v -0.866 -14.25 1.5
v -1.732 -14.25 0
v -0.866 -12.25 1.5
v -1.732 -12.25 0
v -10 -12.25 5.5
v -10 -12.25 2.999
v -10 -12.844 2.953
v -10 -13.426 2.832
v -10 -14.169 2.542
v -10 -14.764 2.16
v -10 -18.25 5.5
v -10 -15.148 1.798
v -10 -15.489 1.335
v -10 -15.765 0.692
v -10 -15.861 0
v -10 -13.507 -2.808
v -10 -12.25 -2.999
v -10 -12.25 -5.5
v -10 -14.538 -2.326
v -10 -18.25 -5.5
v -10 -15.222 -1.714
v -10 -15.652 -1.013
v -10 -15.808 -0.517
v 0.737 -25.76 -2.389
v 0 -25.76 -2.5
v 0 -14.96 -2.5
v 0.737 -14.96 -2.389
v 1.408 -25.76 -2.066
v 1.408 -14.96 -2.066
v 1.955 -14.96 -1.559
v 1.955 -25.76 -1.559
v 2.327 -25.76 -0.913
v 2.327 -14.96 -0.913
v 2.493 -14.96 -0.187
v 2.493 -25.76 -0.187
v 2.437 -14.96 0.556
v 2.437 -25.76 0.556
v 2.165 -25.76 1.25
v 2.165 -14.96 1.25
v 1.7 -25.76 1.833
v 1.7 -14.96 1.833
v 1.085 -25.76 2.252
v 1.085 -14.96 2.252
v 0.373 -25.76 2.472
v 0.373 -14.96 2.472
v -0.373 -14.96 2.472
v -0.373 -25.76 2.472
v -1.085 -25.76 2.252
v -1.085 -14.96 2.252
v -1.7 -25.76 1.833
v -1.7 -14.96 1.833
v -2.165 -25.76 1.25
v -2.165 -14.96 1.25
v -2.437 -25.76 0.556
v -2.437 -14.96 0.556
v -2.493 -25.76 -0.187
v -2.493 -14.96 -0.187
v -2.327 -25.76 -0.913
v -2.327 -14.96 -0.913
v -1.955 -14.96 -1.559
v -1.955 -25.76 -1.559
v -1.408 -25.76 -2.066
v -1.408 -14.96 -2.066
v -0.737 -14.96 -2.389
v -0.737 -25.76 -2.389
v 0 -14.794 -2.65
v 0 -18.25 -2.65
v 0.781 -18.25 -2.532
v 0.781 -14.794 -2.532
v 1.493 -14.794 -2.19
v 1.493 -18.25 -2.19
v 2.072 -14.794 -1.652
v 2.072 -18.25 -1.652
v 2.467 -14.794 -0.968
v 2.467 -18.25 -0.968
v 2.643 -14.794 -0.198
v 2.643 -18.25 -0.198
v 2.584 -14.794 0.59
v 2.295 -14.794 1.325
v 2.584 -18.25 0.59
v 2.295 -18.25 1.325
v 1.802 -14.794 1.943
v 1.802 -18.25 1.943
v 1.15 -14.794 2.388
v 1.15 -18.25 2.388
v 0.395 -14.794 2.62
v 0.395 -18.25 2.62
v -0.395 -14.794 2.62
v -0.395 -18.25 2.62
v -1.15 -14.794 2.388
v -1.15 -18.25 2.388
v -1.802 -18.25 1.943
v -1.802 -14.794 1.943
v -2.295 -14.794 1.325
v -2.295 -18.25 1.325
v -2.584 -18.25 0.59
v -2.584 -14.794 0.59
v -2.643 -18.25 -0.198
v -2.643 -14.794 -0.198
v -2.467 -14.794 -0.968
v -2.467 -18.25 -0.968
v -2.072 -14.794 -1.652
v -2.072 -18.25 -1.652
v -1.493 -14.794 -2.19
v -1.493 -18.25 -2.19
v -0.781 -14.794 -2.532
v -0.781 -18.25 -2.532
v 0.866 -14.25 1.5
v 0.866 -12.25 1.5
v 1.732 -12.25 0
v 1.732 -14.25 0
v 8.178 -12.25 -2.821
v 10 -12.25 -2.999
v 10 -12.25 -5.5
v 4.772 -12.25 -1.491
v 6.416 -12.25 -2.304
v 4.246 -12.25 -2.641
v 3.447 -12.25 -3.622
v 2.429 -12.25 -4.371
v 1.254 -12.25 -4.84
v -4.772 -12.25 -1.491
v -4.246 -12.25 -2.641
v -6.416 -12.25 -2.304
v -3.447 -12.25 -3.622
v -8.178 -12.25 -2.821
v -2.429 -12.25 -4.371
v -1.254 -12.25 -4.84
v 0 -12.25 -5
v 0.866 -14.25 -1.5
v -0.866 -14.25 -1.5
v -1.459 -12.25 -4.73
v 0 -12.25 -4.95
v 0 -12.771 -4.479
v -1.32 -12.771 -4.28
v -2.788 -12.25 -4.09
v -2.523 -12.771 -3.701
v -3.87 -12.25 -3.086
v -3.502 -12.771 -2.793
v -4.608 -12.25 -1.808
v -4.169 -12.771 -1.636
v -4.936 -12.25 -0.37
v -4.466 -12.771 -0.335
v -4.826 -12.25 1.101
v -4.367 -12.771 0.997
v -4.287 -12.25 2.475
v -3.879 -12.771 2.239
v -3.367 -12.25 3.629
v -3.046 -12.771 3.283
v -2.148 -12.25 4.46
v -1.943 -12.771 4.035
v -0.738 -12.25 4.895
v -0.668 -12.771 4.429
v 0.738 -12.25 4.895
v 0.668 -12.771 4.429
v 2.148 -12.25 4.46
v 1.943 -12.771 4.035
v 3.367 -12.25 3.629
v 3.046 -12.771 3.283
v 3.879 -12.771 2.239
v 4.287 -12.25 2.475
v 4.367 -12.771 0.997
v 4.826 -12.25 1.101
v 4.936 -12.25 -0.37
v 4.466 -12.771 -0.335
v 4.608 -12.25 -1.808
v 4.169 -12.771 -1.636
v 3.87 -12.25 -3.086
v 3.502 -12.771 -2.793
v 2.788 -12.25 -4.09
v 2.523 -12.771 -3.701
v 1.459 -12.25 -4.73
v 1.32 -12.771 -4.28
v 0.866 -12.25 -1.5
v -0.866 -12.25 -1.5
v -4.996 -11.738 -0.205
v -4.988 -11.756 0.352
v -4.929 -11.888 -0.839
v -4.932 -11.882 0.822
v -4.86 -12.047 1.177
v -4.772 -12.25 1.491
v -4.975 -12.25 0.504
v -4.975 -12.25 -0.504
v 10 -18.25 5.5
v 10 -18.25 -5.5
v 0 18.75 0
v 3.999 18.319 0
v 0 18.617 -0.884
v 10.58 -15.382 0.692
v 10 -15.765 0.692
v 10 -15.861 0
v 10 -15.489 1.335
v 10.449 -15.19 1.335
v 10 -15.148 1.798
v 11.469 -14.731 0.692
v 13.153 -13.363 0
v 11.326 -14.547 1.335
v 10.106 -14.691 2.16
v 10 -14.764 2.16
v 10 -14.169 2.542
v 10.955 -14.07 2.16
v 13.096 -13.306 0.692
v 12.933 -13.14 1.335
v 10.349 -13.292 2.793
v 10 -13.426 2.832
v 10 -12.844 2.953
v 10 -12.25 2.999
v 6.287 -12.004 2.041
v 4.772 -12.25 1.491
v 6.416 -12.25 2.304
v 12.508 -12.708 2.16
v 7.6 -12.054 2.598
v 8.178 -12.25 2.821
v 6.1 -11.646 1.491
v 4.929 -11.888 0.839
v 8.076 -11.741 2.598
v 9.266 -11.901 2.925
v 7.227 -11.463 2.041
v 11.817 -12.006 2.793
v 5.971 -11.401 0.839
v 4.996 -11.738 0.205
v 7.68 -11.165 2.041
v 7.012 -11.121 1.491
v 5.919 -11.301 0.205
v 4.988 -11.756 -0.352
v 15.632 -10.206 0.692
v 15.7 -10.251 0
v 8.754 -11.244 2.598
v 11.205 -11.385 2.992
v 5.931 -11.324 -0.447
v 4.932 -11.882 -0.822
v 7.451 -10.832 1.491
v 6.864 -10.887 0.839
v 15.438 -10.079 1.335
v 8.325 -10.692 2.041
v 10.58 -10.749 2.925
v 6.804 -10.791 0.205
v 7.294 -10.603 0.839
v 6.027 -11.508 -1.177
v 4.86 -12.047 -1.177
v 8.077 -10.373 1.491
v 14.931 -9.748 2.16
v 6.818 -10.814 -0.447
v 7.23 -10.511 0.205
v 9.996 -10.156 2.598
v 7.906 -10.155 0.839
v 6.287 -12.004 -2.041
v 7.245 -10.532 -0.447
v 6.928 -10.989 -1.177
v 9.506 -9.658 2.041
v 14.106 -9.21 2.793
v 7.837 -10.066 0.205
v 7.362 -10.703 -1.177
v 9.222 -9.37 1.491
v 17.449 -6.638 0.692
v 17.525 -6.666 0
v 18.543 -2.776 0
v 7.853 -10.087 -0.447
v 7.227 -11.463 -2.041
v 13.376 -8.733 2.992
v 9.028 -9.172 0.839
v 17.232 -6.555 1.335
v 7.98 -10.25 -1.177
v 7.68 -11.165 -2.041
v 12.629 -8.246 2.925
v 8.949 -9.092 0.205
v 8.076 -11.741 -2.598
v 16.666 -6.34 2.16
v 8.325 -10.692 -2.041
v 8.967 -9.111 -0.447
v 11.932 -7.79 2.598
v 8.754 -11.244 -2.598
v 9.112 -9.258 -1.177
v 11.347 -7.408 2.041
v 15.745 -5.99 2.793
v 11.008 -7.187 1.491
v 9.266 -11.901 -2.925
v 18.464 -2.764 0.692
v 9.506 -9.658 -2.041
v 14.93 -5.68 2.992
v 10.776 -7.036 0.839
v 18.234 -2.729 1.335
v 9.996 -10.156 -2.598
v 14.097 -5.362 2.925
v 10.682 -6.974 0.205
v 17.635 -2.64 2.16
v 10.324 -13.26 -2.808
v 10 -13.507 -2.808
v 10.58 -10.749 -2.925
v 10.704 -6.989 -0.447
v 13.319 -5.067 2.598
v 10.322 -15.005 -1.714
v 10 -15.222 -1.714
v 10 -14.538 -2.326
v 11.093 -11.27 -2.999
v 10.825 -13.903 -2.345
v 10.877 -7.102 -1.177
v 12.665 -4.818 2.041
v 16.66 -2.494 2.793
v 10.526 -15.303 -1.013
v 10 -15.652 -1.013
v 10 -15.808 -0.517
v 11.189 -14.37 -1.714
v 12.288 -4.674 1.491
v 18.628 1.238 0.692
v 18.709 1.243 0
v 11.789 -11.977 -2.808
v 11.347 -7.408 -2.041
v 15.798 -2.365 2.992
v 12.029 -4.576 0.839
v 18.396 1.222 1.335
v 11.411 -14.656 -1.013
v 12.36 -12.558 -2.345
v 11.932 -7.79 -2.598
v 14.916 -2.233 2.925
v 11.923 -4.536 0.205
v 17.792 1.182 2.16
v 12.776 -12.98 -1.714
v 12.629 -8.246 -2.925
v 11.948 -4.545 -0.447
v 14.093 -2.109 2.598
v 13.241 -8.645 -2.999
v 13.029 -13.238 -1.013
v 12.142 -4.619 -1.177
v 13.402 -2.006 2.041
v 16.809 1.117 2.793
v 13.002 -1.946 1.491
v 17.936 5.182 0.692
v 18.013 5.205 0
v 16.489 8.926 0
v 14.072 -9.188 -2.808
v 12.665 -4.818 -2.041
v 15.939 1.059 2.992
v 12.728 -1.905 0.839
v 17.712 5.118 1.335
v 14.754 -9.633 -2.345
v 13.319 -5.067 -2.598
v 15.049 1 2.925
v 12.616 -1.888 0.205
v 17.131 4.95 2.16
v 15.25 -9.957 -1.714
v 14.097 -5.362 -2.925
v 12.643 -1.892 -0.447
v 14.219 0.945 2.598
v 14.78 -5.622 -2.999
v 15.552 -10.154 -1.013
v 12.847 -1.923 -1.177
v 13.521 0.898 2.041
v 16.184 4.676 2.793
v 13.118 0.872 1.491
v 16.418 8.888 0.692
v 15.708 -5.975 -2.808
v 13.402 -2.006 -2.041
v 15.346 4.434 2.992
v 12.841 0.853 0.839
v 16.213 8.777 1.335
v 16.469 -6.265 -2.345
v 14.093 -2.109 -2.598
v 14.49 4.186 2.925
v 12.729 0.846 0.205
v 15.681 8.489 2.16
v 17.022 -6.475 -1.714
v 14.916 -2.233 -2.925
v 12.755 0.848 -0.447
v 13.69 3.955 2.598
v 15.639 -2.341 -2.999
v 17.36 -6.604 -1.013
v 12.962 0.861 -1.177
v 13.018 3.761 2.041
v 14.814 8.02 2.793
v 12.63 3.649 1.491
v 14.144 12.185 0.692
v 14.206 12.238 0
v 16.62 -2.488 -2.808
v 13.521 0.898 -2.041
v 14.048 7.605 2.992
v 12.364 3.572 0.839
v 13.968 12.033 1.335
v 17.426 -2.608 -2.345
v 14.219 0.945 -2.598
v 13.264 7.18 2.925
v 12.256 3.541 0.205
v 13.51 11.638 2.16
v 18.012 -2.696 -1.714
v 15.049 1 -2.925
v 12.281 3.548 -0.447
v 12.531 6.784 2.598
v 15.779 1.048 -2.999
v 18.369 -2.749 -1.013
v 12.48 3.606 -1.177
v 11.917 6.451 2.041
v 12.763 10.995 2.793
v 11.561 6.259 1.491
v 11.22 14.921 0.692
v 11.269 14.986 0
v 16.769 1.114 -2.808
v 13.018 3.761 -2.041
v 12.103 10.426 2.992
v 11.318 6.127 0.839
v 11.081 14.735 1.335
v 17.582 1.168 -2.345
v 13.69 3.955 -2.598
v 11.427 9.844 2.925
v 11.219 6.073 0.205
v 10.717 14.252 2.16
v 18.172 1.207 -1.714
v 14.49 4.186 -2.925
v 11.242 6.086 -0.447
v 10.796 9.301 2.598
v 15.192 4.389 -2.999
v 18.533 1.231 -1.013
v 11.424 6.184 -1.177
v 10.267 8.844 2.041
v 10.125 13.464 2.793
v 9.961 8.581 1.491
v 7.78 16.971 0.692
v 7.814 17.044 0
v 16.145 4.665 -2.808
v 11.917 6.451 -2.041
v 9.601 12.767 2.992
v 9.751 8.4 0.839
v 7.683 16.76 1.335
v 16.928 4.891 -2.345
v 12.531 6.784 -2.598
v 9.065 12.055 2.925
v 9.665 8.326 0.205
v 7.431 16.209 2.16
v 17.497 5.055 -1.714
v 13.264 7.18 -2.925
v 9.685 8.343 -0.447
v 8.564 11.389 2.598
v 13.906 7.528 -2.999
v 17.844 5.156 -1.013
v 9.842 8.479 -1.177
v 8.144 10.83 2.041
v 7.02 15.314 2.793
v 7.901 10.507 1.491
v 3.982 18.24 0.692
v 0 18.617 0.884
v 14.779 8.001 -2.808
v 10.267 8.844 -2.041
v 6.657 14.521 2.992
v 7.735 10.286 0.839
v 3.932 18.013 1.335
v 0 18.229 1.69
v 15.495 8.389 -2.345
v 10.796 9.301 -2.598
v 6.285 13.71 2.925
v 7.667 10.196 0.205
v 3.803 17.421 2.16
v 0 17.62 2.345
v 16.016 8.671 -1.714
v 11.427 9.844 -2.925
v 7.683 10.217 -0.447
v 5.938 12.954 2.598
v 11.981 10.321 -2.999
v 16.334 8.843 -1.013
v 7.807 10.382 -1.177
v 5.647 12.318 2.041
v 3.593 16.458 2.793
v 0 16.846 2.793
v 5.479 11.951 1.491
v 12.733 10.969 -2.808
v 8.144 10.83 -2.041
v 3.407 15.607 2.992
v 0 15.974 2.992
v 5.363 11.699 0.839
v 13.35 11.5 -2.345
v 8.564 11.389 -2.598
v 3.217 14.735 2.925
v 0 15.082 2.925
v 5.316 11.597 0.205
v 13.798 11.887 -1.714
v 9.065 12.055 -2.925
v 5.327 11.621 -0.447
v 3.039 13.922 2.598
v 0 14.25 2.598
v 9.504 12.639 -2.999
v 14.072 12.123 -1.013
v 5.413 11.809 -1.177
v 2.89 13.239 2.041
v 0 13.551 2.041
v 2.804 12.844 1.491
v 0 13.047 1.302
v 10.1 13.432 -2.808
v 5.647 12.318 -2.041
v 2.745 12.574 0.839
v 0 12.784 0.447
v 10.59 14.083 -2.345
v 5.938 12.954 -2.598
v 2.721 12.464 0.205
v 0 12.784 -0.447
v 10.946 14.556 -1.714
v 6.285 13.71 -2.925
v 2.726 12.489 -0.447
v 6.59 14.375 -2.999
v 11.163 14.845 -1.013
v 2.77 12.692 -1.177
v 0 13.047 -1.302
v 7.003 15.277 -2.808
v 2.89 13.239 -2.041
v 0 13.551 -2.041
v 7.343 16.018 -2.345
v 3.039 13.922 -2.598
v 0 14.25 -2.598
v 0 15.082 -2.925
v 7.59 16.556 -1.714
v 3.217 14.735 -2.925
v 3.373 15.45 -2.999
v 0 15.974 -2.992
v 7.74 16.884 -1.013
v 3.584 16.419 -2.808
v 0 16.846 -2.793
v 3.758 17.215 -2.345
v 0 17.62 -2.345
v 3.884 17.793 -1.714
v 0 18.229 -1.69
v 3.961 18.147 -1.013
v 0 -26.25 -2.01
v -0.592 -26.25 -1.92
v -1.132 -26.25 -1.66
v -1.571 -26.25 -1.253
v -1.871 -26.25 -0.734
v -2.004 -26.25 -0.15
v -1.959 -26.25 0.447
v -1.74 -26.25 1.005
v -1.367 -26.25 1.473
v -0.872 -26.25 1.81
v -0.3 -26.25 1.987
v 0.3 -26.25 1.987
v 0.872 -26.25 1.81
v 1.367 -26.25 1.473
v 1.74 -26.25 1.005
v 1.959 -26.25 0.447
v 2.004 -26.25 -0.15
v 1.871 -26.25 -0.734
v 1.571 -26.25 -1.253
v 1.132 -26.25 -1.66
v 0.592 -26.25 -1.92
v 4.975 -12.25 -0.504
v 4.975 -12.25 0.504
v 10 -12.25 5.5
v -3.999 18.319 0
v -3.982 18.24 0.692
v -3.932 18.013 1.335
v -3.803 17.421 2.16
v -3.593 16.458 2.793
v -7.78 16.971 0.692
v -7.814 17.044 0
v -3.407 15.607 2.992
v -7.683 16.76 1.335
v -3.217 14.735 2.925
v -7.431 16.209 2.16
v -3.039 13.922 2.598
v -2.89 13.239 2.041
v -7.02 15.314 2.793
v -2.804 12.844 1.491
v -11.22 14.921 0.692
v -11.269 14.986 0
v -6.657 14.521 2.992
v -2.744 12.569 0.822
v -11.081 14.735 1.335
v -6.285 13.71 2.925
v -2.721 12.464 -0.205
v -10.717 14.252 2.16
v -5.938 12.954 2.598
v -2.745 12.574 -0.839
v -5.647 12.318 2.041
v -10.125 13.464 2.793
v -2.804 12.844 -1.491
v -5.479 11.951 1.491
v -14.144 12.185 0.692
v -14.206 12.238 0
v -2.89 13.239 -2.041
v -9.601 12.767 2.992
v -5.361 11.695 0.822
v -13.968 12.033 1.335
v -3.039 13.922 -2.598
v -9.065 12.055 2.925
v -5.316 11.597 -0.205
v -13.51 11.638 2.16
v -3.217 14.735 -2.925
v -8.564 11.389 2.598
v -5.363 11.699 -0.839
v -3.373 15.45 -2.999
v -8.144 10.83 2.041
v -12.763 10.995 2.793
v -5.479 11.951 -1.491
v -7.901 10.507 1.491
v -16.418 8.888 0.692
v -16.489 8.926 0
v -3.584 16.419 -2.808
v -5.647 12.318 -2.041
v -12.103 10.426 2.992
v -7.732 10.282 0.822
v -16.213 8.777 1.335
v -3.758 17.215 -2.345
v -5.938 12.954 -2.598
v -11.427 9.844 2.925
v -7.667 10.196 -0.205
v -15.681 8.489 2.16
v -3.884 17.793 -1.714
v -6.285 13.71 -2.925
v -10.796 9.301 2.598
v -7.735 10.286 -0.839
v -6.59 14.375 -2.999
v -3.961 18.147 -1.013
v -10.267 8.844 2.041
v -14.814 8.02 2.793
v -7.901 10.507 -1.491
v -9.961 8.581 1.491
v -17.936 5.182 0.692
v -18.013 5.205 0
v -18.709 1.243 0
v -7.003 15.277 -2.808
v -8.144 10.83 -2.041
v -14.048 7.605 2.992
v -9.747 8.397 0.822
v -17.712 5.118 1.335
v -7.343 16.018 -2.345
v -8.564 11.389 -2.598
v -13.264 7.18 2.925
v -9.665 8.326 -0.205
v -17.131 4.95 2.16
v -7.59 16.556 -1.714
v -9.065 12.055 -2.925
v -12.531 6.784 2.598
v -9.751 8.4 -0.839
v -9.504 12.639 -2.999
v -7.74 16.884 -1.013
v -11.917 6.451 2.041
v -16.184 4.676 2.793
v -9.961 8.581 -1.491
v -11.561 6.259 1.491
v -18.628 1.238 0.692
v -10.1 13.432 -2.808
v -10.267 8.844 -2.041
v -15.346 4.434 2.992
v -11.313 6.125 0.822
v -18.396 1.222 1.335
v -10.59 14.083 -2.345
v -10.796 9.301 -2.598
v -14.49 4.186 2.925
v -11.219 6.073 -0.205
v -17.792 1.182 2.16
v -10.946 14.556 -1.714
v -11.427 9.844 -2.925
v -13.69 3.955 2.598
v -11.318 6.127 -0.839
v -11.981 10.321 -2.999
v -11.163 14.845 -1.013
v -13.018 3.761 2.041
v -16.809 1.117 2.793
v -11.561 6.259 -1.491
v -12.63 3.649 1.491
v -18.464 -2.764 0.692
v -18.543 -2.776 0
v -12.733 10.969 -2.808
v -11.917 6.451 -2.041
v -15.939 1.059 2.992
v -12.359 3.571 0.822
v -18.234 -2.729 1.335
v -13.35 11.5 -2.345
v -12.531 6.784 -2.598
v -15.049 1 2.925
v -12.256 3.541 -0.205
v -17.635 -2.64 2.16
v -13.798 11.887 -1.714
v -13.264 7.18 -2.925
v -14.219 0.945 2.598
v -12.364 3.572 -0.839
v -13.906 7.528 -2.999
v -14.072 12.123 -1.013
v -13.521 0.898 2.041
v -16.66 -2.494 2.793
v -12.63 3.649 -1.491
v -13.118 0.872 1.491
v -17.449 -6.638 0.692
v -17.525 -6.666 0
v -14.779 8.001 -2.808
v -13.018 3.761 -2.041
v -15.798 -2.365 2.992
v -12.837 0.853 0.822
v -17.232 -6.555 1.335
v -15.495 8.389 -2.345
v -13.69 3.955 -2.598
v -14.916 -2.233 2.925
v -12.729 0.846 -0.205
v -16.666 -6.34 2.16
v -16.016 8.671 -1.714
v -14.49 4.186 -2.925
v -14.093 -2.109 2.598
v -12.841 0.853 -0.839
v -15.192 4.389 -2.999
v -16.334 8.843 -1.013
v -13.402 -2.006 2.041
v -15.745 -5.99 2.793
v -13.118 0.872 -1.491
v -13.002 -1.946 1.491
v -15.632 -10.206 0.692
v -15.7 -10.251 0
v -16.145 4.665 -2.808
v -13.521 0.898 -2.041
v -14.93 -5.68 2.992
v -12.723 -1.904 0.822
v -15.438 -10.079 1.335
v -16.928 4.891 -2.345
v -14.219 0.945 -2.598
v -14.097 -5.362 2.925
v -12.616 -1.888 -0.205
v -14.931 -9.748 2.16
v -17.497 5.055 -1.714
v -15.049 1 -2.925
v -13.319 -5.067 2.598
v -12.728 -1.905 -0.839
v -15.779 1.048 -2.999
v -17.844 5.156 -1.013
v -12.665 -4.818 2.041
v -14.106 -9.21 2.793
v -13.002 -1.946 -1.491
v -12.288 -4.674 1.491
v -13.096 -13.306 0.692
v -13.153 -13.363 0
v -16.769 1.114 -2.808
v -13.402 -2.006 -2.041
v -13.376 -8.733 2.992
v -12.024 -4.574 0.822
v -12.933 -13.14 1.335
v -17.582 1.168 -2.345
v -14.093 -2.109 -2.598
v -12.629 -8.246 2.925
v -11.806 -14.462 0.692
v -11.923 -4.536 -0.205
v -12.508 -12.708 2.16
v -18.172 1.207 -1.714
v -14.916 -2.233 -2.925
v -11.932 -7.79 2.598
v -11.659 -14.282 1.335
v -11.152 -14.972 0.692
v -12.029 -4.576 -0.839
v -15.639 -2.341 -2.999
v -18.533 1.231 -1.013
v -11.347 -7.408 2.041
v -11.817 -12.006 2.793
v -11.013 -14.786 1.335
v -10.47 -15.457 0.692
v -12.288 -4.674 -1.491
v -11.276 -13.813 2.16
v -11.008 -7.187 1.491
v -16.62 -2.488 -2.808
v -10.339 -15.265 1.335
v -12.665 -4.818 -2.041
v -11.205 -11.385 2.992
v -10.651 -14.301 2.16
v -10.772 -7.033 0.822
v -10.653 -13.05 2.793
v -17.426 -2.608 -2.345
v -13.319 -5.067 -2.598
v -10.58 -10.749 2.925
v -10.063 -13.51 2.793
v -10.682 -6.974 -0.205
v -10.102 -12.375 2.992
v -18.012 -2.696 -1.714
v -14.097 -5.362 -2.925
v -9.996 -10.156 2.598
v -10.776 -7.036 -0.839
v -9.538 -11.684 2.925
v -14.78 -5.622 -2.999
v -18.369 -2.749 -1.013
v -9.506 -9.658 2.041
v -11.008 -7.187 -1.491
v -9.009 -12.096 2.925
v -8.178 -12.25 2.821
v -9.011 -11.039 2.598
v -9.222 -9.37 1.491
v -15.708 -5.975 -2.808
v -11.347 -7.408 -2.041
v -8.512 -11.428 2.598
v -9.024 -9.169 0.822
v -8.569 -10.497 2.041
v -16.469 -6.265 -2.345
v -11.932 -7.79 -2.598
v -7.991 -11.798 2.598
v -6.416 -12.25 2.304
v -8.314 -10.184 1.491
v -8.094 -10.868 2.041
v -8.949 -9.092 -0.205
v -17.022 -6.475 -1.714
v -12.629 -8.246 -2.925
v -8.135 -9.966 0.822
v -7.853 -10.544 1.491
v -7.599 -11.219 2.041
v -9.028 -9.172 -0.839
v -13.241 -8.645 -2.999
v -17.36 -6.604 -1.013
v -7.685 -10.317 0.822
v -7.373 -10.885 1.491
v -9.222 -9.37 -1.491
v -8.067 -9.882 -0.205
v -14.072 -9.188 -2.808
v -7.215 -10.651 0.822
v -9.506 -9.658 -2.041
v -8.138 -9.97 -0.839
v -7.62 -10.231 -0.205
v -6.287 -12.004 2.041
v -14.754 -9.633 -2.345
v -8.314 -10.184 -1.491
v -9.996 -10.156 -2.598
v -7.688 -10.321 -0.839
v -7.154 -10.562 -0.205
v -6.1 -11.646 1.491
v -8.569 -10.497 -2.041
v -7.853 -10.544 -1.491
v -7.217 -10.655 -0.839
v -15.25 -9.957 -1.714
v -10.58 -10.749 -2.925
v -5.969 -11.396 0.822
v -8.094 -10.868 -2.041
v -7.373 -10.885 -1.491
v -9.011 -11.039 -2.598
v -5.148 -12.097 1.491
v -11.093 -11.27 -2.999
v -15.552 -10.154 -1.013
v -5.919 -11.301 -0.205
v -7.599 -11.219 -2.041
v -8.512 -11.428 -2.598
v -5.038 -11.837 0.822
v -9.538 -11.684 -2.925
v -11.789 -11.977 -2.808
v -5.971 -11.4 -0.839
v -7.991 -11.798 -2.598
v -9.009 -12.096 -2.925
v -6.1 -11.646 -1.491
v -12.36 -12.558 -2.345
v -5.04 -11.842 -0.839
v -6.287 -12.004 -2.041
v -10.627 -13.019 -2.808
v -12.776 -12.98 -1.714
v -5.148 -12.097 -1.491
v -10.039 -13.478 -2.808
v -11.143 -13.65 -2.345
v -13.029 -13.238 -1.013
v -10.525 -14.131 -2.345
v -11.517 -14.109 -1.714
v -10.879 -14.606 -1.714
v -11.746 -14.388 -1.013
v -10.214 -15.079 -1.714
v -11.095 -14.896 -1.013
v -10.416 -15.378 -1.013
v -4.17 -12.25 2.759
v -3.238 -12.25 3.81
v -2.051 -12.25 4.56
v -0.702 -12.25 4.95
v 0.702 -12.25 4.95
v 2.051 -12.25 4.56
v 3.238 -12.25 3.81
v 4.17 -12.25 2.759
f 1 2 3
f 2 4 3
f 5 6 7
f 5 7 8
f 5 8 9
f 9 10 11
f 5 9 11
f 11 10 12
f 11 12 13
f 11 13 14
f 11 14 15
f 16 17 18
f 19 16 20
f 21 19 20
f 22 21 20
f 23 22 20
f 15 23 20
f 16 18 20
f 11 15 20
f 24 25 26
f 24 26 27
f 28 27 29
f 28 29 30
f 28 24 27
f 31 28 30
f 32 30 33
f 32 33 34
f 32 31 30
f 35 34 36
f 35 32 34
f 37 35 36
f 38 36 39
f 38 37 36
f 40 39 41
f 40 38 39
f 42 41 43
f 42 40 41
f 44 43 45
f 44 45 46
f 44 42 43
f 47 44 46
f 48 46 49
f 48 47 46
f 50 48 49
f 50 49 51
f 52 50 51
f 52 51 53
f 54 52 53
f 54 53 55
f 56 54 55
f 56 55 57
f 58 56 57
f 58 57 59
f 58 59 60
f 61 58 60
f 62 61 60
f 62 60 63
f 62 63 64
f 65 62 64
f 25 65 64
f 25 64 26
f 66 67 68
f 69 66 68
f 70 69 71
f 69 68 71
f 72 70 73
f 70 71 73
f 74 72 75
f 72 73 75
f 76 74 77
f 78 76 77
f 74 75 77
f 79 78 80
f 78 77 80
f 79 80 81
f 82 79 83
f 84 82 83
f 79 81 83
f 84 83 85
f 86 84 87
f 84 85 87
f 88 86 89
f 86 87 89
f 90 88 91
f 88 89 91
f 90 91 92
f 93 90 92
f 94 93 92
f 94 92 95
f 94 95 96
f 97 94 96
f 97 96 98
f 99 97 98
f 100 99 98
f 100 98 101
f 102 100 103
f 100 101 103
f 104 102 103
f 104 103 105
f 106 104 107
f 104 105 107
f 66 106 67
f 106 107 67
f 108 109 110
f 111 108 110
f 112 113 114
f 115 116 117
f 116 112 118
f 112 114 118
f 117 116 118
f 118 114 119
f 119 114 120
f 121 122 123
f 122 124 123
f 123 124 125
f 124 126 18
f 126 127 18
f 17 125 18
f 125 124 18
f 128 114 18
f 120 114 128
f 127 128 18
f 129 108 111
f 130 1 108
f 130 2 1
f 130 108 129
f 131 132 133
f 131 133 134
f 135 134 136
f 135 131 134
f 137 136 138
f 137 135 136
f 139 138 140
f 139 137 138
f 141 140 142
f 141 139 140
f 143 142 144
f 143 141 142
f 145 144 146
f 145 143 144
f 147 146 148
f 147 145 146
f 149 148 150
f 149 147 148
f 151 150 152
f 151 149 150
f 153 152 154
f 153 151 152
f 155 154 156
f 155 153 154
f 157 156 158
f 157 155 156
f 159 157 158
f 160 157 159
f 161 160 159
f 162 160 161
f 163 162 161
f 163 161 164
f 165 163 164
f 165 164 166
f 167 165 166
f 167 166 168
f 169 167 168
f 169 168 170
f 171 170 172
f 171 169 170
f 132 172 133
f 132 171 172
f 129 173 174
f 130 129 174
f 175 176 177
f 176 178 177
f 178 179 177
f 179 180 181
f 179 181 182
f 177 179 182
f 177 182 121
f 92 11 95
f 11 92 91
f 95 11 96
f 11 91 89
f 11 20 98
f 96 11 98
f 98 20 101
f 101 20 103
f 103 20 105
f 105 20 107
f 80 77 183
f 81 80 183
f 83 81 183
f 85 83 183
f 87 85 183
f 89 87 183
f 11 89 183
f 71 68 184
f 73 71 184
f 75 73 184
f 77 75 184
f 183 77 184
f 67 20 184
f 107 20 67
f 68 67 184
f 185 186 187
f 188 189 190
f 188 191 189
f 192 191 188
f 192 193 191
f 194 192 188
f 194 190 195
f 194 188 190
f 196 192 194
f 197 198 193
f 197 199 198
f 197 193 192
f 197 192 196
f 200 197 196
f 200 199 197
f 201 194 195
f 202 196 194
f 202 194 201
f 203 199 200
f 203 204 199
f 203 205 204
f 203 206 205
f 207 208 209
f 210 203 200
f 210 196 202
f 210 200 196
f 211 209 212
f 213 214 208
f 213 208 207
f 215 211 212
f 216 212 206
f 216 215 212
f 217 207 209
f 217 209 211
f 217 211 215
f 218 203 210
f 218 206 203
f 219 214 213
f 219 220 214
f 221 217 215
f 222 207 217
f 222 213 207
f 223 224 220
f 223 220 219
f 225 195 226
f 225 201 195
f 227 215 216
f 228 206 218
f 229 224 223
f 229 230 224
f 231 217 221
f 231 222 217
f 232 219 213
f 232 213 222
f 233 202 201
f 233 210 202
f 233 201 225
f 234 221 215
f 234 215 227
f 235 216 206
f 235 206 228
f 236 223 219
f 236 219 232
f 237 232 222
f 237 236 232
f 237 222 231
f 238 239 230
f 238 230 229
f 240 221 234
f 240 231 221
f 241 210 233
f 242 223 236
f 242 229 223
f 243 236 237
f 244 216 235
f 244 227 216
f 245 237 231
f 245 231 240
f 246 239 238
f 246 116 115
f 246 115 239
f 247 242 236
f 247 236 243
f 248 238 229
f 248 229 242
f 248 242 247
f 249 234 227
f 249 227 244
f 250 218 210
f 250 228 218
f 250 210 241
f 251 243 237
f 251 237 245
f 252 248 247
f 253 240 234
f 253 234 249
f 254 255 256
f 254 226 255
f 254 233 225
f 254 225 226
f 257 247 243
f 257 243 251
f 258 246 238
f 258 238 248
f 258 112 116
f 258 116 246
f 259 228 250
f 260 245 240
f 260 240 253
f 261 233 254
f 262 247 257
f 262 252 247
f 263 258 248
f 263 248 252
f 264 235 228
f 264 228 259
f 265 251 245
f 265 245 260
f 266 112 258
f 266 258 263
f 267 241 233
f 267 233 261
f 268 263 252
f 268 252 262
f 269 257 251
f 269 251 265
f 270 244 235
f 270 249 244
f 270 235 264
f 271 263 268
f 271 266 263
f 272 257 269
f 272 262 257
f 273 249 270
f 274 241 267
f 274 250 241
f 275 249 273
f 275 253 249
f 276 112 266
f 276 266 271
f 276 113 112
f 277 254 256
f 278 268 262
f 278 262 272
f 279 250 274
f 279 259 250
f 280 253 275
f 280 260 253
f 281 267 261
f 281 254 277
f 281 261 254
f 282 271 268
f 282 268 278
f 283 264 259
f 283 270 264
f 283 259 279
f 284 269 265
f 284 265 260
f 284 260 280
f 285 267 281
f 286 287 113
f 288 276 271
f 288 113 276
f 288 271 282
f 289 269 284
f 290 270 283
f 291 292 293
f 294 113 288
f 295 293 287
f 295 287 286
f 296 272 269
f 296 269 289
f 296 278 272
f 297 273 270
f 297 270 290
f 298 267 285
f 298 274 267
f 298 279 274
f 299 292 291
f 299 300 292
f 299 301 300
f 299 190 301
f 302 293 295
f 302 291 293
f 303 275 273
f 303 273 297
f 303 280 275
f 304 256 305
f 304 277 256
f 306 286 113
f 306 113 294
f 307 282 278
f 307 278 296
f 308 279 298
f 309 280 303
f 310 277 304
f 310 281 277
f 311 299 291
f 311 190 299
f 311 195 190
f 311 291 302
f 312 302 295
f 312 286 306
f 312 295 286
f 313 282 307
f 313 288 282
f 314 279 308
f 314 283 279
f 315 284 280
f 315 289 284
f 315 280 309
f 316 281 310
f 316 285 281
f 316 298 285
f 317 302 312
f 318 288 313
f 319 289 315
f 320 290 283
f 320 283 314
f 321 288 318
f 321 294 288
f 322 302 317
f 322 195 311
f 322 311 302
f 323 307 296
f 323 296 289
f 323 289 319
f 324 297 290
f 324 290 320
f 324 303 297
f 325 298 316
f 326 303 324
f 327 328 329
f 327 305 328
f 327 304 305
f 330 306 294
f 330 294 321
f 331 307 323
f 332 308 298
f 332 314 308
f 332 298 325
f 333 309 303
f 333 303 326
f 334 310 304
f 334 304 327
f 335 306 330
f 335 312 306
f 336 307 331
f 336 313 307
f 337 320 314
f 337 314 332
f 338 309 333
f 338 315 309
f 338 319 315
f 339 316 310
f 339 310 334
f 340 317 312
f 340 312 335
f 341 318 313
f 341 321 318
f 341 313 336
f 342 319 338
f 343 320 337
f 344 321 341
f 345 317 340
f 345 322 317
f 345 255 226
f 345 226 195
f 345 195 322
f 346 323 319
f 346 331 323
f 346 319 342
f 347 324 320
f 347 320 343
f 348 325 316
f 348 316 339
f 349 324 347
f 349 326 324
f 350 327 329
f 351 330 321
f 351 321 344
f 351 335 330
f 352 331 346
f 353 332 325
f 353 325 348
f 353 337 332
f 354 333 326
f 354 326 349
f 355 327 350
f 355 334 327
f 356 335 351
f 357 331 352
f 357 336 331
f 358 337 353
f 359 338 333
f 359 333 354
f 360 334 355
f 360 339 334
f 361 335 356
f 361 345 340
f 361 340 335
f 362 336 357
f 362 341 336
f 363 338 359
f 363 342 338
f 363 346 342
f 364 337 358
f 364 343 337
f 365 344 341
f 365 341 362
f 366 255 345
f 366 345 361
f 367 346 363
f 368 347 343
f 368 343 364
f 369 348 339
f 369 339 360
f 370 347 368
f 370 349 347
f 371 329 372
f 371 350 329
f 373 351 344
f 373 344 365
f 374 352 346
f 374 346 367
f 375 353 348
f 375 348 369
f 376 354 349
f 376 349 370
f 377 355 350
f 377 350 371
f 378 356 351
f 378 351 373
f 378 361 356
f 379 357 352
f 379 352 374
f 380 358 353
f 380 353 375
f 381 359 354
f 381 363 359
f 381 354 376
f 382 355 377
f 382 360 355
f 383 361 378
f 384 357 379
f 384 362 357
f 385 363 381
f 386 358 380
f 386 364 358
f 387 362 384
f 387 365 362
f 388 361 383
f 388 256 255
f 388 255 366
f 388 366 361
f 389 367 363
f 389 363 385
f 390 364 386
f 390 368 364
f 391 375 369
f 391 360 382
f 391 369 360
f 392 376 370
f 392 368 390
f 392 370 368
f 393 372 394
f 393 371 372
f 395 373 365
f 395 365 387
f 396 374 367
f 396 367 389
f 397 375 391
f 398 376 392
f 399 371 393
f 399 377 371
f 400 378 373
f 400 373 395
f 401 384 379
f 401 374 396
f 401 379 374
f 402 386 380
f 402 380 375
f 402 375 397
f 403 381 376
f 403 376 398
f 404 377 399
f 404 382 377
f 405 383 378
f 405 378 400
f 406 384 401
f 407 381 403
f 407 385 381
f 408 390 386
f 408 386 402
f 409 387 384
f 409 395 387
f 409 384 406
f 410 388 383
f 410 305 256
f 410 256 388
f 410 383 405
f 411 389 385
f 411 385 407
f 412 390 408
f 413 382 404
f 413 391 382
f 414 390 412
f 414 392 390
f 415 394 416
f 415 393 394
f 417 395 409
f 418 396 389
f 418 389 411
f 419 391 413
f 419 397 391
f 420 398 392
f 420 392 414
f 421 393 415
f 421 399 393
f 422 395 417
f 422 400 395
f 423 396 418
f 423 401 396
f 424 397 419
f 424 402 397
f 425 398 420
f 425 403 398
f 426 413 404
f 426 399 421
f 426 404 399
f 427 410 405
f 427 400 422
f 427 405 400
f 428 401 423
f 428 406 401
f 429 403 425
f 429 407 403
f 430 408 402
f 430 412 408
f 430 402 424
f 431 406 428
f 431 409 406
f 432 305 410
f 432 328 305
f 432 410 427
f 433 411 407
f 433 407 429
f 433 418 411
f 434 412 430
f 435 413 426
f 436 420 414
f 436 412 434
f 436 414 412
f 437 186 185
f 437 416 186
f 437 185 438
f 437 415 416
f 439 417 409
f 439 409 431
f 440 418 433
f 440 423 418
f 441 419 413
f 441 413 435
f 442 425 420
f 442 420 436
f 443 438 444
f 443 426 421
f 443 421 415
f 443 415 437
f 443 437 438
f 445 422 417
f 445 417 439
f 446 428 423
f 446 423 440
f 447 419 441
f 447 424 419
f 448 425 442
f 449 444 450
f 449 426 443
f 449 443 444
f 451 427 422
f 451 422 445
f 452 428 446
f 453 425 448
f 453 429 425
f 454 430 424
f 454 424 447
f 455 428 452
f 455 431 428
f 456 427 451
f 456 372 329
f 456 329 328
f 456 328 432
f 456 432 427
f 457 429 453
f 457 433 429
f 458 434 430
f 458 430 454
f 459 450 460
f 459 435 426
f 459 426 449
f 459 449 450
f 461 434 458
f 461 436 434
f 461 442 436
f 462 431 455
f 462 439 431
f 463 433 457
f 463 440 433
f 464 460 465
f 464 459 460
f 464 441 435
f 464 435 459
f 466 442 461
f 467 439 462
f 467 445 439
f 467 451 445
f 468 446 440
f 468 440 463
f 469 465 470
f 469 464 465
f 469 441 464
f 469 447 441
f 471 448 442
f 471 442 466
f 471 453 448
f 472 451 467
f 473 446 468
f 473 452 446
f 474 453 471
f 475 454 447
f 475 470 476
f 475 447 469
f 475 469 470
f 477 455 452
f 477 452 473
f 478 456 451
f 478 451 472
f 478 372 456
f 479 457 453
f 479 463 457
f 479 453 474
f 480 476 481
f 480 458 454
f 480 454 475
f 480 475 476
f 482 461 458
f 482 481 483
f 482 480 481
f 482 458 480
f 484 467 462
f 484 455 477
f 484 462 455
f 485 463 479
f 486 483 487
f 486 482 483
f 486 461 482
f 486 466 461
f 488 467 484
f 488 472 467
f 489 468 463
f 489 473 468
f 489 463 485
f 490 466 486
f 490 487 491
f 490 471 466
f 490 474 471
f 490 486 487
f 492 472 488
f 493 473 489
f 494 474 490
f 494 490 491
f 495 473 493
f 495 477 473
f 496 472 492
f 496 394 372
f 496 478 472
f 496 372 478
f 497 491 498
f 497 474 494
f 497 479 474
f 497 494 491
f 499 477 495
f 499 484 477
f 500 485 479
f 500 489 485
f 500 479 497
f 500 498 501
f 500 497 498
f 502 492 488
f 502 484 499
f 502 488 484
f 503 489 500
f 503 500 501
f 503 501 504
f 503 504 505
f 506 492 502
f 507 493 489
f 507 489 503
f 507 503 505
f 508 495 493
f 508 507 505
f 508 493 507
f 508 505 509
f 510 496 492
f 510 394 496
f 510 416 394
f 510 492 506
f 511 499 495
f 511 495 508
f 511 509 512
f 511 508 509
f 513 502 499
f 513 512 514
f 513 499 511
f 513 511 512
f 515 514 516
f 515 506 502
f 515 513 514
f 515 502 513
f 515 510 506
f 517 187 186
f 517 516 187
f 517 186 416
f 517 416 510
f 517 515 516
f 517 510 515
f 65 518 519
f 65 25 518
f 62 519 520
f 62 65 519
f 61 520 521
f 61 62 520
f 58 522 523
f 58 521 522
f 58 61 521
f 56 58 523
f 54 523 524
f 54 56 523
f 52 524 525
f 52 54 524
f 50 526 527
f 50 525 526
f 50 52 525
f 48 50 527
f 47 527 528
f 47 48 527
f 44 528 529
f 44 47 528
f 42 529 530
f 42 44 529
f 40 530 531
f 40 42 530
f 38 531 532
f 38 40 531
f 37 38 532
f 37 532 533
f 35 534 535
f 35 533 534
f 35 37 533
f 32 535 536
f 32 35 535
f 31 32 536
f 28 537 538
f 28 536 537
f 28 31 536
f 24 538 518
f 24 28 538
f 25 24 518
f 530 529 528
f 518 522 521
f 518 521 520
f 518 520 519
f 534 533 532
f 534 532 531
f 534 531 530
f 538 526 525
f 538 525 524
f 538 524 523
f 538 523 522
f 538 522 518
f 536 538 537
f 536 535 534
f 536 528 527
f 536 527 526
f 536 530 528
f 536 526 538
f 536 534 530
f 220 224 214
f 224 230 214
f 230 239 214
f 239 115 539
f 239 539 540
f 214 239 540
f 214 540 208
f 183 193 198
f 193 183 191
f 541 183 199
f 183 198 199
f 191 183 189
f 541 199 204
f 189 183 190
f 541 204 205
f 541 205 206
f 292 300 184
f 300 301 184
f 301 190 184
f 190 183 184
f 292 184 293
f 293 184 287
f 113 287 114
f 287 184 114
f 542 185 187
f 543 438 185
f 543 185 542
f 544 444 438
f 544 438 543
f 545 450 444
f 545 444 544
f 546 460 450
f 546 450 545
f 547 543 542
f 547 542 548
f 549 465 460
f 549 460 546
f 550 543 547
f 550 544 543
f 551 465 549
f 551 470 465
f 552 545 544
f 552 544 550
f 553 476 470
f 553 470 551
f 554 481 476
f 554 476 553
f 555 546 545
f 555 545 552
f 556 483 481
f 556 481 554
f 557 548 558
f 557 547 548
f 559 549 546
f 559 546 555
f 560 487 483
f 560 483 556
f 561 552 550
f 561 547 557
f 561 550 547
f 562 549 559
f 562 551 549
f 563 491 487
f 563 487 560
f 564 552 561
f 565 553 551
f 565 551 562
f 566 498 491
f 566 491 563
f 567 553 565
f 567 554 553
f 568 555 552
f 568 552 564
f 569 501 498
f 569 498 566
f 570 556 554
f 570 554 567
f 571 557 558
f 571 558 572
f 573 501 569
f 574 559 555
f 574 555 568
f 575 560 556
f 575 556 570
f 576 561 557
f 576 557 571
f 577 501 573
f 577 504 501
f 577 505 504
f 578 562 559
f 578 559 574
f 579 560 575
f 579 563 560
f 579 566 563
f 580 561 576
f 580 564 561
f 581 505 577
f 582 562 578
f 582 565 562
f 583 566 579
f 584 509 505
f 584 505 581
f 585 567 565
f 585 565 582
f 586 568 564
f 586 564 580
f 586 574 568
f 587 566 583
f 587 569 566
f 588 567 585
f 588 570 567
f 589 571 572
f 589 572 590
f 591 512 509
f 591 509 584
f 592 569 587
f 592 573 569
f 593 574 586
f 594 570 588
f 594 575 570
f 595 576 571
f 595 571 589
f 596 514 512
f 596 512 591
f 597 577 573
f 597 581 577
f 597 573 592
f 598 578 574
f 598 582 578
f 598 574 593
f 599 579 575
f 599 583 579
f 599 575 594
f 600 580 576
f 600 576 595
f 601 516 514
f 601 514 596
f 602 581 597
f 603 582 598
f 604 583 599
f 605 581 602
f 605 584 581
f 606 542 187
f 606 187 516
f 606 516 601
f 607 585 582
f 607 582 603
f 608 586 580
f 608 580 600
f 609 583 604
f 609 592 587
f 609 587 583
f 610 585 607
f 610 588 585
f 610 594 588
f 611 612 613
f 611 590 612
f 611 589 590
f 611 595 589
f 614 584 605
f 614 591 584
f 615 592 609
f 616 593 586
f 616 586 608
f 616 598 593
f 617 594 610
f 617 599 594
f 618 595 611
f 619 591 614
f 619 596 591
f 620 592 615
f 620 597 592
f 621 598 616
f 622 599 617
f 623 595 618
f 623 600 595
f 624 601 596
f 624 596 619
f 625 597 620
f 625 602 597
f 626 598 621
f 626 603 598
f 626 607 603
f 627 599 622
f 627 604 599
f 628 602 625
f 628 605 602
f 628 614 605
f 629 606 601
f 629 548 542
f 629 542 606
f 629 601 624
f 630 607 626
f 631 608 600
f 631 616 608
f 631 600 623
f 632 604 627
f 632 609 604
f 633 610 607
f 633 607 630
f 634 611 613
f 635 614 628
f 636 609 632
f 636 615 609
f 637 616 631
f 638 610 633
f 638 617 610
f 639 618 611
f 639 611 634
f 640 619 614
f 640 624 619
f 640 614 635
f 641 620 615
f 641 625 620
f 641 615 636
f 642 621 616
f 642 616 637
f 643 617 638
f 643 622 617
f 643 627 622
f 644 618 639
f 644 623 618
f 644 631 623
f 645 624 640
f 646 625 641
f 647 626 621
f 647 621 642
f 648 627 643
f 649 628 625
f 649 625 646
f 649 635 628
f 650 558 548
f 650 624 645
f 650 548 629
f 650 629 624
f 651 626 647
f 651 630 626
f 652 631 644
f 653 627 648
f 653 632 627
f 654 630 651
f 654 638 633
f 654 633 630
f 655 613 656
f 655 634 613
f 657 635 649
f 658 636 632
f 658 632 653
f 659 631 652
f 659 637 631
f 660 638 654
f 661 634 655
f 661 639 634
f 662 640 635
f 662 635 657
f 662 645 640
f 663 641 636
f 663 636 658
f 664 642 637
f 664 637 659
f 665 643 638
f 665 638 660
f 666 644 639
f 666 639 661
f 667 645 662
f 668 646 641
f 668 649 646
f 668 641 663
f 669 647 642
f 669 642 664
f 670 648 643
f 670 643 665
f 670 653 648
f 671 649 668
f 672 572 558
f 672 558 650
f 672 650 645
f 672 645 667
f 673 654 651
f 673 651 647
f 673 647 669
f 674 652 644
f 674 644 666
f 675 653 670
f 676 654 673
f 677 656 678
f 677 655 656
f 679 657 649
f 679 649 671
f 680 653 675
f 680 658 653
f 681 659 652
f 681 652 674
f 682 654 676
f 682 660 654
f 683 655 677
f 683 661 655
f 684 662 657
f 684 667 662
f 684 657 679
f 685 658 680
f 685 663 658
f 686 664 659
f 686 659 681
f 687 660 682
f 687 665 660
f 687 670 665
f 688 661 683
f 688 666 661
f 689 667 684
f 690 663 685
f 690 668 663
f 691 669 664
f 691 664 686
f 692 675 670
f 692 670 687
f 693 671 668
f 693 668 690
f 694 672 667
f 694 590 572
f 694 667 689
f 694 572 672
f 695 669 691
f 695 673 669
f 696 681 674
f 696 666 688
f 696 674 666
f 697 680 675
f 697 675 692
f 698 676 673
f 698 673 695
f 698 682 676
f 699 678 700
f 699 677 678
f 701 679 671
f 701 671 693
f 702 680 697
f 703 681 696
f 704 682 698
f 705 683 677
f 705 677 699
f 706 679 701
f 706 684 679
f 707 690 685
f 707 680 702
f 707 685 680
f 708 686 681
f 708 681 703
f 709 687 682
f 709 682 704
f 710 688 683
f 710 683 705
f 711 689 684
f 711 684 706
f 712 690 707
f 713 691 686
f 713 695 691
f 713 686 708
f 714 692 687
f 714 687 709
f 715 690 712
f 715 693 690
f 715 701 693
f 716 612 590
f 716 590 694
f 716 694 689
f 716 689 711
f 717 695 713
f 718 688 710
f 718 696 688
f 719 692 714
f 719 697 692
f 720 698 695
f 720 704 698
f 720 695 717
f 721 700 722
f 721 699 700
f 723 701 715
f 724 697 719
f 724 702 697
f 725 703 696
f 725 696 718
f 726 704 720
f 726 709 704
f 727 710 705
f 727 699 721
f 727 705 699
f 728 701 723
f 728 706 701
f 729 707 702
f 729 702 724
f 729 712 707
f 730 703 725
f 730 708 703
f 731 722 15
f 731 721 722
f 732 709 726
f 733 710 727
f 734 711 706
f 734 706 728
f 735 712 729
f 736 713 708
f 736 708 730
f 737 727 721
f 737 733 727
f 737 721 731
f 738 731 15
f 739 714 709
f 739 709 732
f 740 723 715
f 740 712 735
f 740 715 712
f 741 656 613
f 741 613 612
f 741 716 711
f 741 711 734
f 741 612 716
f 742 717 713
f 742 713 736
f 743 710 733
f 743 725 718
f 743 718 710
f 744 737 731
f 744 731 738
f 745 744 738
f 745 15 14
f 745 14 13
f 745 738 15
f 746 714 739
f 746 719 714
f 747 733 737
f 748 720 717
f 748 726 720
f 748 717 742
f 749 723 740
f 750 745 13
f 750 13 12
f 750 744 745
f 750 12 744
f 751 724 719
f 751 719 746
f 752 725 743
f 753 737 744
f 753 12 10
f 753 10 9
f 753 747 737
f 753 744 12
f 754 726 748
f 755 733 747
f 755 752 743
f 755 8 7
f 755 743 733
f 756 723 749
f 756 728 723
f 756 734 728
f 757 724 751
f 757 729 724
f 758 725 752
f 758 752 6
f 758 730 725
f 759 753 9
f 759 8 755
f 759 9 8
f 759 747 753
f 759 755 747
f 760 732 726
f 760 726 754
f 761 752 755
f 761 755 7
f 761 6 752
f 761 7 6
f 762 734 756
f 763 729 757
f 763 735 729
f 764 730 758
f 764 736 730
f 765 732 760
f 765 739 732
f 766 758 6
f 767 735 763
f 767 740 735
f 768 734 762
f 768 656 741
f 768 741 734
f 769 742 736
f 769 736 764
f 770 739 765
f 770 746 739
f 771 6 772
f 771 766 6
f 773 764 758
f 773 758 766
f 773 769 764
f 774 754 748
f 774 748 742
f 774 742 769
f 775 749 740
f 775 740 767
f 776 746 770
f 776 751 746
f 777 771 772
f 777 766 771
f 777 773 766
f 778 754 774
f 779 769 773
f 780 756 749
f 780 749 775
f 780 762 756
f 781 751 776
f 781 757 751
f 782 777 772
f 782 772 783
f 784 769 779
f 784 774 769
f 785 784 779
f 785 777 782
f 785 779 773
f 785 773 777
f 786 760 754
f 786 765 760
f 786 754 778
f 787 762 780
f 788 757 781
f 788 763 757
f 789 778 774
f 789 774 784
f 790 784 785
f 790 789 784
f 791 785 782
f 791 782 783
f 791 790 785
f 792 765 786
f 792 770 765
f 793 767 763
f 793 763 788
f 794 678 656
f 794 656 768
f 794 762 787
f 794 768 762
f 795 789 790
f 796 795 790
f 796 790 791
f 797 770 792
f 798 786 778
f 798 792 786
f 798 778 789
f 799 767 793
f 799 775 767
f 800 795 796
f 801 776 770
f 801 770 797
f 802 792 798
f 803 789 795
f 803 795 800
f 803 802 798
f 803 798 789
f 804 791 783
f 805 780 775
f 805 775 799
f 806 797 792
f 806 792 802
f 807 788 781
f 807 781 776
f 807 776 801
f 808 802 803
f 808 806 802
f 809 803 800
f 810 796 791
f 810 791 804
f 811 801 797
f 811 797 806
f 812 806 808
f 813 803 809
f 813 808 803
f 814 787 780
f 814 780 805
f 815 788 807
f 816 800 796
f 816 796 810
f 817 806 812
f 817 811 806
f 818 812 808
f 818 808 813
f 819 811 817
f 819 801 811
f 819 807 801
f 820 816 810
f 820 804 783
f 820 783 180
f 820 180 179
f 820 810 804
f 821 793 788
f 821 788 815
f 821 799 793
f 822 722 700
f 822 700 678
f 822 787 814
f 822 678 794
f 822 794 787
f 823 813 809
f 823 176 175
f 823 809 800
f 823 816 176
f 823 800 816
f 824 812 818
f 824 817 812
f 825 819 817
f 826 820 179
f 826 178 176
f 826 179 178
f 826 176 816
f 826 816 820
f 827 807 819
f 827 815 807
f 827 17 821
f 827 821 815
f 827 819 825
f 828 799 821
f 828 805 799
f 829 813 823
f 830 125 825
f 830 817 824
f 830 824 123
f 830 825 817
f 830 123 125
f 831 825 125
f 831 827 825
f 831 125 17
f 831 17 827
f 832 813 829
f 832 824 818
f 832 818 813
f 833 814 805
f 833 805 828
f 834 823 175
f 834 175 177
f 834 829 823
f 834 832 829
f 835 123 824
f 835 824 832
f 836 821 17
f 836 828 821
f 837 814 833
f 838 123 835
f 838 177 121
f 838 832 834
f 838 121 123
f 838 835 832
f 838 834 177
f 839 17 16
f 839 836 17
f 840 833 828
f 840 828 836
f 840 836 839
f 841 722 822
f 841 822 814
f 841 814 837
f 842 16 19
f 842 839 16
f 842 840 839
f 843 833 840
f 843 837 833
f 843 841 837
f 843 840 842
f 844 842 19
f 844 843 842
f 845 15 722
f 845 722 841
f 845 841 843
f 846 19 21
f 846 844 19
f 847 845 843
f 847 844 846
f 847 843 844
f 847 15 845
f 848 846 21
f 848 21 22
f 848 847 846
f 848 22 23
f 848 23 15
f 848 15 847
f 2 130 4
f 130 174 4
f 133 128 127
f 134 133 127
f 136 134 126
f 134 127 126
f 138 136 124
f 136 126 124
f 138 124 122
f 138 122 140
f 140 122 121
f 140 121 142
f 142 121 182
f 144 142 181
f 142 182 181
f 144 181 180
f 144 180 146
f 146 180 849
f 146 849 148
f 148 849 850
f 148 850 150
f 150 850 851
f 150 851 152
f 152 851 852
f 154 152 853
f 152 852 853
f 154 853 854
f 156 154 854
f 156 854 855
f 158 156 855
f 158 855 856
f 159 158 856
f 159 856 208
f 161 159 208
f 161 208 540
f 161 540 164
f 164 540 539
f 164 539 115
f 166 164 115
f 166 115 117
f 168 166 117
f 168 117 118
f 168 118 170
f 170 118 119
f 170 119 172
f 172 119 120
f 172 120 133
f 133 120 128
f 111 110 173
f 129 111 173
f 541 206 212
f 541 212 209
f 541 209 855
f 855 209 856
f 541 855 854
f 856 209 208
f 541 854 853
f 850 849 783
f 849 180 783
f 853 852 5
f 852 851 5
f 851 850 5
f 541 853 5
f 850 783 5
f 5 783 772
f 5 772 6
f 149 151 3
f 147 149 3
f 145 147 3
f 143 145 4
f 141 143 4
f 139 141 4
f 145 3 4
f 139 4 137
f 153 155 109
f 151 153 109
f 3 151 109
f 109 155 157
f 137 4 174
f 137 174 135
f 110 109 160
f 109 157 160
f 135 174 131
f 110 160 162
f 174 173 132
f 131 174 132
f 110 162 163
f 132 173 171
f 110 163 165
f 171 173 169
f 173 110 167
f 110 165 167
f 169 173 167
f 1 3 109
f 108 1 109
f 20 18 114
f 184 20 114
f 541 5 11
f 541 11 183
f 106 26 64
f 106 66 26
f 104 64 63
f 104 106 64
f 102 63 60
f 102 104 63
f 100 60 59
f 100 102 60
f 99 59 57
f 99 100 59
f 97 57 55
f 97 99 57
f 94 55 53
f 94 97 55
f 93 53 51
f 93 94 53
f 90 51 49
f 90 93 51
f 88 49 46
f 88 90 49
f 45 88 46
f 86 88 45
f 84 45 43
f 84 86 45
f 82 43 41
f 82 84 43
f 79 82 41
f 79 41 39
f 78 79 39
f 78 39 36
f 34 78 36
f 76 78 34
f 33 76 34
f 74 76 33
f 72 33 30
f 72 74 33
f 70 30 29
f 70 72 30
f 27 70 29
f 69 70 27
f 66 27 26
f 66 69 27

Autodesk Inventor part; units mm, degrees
sketch "Sketch_1" plane through (0, 0, 0) normal (1, 0, 0) x (0, 1, 0)
  line L0 (0, -50) -> (0, 50)
  circle A0 centre (15.75, 0) radius 3
revolve "Revolution1" add sketch "Sketch_1" angle 360 about axis through (0, 0, -50) along (0, 0, -1)
sketch "Sketch_3" plane through (0, 0, 0) normal (0, 0, 1) x (1, 0, 0)
  line L0 (-20, -23.25) -> (20, -23.25)
  line L1 (20, -23.25) -> (20, -18.25)
  line L2 (20, -18.25) -> (-20, -18.25)
  line L3 (-20, -18.25) -> (-20, -23.25)
sketch "Sketch_2" plane through (0, 0, 0) normal (0, 0, 1) x (1, 0, 0)
  line L0 (-10, -18.25) -> (10, -18.25)
  line L1 (10, -18.25) -> (10, -12.25)
  line L2 (10, -12.25) -> (-10, -12.25)
  line L3 (-10, -12.25) -> (-10, -18.25)
extrude "Extrusion1" add sketch "Sketch_2" along normal mid plane 11
extrude "Extrusion2" cut sketch "Sketch_3" along normal mid plane 11
sketch "Sketch_4" plane through (0, 0, 0) normal (1, 0, 0) x (0, 1, 0)
  line L0 (-50, 0) -> (50, 0)
  line L1 (-7.25, 0) -> (-7.25, -5)
  line L2 (-7.25, -5) -> (-12.25, -5)
  line L3 (-12.25, -5) -> (-14.6, -2.65)
  line L4 (-14.6, -2.65) -> (-18.25, -2.65)
  line L5 (-18.25, -2.65) -> (-18.25, 0)
  line L6 (-18.25, 0) -> (-7.25, 0)
revolve "Revolution2" cut sketch "Sketch_4" angle 360 about axis through (0, -50, 0) along (0, -1, 0)
sketch "Sketch_5" plane through (0, 0, 0) normal (1, 0, 0) x (0, 1, 0)
  line L0 (-26.25, 0) -> (-12.25, 0)
  line L1 (-12.25, 0) -> (-12.25, -4.95)
  line L2 (-12.25, -4.95) -> (-14.96, -2.5)
  line L3 (-14.96, -2.5) -> (-25.7595, -2.5)
  line L4 (-25.7595, -2.5) -> (-26.25, -2.0095)
  line L5 (-26.25, -2.0095) -> (-26.25, 0)
  line L6 (-26.25, 0) -> (-12.25, 0)
revolve "Revolution3" add sketch "Sketch_5" angle 360 about axis through (0, -26.25, 0) along (0, -1, 0)
thread "Thread1" size "M5x0.8" class "6g" standard "ISO Metric profile" length 10 offset 1.29
sketch "Sketch_6" plane through (0, -12.25, 0) normal (0, 1, 0) x (0, 0, -1)
  line L0 (-1.5, 0.866) -> (-1.5, -0.866)
  line L1 (-1.5, -0.866) -> (0, -1.7321)
  line L2 (0, -1.7321) -> (1.5, -0.866)
  line L3 (1.5, -0.866) -> (1.5, 0.866)
  line L4 (1.5, 0.866) -> (0, 1.7321)
  line L5 (0, 1.7321) -> (-1.5, 0.866)
extrude "Extrusion3" cut sketch "Sketch_6" against normal blind 2
ref_plane "side_1_XY" through (0, -18.25, 0) normal (0, -1, 0) x (1, 0, 0)
ref_plane "side_1_YZ" through (0, -18.25, 0) normal (1, 0, 0) x (0, 0, 1)
ref_plane "side_1_ZX" through (0, -18.25, 0) normal (0, 0, 1) x (0, -1, 0)
properties part number "May Tec 1.71.30365_Installation ring_36.5"
